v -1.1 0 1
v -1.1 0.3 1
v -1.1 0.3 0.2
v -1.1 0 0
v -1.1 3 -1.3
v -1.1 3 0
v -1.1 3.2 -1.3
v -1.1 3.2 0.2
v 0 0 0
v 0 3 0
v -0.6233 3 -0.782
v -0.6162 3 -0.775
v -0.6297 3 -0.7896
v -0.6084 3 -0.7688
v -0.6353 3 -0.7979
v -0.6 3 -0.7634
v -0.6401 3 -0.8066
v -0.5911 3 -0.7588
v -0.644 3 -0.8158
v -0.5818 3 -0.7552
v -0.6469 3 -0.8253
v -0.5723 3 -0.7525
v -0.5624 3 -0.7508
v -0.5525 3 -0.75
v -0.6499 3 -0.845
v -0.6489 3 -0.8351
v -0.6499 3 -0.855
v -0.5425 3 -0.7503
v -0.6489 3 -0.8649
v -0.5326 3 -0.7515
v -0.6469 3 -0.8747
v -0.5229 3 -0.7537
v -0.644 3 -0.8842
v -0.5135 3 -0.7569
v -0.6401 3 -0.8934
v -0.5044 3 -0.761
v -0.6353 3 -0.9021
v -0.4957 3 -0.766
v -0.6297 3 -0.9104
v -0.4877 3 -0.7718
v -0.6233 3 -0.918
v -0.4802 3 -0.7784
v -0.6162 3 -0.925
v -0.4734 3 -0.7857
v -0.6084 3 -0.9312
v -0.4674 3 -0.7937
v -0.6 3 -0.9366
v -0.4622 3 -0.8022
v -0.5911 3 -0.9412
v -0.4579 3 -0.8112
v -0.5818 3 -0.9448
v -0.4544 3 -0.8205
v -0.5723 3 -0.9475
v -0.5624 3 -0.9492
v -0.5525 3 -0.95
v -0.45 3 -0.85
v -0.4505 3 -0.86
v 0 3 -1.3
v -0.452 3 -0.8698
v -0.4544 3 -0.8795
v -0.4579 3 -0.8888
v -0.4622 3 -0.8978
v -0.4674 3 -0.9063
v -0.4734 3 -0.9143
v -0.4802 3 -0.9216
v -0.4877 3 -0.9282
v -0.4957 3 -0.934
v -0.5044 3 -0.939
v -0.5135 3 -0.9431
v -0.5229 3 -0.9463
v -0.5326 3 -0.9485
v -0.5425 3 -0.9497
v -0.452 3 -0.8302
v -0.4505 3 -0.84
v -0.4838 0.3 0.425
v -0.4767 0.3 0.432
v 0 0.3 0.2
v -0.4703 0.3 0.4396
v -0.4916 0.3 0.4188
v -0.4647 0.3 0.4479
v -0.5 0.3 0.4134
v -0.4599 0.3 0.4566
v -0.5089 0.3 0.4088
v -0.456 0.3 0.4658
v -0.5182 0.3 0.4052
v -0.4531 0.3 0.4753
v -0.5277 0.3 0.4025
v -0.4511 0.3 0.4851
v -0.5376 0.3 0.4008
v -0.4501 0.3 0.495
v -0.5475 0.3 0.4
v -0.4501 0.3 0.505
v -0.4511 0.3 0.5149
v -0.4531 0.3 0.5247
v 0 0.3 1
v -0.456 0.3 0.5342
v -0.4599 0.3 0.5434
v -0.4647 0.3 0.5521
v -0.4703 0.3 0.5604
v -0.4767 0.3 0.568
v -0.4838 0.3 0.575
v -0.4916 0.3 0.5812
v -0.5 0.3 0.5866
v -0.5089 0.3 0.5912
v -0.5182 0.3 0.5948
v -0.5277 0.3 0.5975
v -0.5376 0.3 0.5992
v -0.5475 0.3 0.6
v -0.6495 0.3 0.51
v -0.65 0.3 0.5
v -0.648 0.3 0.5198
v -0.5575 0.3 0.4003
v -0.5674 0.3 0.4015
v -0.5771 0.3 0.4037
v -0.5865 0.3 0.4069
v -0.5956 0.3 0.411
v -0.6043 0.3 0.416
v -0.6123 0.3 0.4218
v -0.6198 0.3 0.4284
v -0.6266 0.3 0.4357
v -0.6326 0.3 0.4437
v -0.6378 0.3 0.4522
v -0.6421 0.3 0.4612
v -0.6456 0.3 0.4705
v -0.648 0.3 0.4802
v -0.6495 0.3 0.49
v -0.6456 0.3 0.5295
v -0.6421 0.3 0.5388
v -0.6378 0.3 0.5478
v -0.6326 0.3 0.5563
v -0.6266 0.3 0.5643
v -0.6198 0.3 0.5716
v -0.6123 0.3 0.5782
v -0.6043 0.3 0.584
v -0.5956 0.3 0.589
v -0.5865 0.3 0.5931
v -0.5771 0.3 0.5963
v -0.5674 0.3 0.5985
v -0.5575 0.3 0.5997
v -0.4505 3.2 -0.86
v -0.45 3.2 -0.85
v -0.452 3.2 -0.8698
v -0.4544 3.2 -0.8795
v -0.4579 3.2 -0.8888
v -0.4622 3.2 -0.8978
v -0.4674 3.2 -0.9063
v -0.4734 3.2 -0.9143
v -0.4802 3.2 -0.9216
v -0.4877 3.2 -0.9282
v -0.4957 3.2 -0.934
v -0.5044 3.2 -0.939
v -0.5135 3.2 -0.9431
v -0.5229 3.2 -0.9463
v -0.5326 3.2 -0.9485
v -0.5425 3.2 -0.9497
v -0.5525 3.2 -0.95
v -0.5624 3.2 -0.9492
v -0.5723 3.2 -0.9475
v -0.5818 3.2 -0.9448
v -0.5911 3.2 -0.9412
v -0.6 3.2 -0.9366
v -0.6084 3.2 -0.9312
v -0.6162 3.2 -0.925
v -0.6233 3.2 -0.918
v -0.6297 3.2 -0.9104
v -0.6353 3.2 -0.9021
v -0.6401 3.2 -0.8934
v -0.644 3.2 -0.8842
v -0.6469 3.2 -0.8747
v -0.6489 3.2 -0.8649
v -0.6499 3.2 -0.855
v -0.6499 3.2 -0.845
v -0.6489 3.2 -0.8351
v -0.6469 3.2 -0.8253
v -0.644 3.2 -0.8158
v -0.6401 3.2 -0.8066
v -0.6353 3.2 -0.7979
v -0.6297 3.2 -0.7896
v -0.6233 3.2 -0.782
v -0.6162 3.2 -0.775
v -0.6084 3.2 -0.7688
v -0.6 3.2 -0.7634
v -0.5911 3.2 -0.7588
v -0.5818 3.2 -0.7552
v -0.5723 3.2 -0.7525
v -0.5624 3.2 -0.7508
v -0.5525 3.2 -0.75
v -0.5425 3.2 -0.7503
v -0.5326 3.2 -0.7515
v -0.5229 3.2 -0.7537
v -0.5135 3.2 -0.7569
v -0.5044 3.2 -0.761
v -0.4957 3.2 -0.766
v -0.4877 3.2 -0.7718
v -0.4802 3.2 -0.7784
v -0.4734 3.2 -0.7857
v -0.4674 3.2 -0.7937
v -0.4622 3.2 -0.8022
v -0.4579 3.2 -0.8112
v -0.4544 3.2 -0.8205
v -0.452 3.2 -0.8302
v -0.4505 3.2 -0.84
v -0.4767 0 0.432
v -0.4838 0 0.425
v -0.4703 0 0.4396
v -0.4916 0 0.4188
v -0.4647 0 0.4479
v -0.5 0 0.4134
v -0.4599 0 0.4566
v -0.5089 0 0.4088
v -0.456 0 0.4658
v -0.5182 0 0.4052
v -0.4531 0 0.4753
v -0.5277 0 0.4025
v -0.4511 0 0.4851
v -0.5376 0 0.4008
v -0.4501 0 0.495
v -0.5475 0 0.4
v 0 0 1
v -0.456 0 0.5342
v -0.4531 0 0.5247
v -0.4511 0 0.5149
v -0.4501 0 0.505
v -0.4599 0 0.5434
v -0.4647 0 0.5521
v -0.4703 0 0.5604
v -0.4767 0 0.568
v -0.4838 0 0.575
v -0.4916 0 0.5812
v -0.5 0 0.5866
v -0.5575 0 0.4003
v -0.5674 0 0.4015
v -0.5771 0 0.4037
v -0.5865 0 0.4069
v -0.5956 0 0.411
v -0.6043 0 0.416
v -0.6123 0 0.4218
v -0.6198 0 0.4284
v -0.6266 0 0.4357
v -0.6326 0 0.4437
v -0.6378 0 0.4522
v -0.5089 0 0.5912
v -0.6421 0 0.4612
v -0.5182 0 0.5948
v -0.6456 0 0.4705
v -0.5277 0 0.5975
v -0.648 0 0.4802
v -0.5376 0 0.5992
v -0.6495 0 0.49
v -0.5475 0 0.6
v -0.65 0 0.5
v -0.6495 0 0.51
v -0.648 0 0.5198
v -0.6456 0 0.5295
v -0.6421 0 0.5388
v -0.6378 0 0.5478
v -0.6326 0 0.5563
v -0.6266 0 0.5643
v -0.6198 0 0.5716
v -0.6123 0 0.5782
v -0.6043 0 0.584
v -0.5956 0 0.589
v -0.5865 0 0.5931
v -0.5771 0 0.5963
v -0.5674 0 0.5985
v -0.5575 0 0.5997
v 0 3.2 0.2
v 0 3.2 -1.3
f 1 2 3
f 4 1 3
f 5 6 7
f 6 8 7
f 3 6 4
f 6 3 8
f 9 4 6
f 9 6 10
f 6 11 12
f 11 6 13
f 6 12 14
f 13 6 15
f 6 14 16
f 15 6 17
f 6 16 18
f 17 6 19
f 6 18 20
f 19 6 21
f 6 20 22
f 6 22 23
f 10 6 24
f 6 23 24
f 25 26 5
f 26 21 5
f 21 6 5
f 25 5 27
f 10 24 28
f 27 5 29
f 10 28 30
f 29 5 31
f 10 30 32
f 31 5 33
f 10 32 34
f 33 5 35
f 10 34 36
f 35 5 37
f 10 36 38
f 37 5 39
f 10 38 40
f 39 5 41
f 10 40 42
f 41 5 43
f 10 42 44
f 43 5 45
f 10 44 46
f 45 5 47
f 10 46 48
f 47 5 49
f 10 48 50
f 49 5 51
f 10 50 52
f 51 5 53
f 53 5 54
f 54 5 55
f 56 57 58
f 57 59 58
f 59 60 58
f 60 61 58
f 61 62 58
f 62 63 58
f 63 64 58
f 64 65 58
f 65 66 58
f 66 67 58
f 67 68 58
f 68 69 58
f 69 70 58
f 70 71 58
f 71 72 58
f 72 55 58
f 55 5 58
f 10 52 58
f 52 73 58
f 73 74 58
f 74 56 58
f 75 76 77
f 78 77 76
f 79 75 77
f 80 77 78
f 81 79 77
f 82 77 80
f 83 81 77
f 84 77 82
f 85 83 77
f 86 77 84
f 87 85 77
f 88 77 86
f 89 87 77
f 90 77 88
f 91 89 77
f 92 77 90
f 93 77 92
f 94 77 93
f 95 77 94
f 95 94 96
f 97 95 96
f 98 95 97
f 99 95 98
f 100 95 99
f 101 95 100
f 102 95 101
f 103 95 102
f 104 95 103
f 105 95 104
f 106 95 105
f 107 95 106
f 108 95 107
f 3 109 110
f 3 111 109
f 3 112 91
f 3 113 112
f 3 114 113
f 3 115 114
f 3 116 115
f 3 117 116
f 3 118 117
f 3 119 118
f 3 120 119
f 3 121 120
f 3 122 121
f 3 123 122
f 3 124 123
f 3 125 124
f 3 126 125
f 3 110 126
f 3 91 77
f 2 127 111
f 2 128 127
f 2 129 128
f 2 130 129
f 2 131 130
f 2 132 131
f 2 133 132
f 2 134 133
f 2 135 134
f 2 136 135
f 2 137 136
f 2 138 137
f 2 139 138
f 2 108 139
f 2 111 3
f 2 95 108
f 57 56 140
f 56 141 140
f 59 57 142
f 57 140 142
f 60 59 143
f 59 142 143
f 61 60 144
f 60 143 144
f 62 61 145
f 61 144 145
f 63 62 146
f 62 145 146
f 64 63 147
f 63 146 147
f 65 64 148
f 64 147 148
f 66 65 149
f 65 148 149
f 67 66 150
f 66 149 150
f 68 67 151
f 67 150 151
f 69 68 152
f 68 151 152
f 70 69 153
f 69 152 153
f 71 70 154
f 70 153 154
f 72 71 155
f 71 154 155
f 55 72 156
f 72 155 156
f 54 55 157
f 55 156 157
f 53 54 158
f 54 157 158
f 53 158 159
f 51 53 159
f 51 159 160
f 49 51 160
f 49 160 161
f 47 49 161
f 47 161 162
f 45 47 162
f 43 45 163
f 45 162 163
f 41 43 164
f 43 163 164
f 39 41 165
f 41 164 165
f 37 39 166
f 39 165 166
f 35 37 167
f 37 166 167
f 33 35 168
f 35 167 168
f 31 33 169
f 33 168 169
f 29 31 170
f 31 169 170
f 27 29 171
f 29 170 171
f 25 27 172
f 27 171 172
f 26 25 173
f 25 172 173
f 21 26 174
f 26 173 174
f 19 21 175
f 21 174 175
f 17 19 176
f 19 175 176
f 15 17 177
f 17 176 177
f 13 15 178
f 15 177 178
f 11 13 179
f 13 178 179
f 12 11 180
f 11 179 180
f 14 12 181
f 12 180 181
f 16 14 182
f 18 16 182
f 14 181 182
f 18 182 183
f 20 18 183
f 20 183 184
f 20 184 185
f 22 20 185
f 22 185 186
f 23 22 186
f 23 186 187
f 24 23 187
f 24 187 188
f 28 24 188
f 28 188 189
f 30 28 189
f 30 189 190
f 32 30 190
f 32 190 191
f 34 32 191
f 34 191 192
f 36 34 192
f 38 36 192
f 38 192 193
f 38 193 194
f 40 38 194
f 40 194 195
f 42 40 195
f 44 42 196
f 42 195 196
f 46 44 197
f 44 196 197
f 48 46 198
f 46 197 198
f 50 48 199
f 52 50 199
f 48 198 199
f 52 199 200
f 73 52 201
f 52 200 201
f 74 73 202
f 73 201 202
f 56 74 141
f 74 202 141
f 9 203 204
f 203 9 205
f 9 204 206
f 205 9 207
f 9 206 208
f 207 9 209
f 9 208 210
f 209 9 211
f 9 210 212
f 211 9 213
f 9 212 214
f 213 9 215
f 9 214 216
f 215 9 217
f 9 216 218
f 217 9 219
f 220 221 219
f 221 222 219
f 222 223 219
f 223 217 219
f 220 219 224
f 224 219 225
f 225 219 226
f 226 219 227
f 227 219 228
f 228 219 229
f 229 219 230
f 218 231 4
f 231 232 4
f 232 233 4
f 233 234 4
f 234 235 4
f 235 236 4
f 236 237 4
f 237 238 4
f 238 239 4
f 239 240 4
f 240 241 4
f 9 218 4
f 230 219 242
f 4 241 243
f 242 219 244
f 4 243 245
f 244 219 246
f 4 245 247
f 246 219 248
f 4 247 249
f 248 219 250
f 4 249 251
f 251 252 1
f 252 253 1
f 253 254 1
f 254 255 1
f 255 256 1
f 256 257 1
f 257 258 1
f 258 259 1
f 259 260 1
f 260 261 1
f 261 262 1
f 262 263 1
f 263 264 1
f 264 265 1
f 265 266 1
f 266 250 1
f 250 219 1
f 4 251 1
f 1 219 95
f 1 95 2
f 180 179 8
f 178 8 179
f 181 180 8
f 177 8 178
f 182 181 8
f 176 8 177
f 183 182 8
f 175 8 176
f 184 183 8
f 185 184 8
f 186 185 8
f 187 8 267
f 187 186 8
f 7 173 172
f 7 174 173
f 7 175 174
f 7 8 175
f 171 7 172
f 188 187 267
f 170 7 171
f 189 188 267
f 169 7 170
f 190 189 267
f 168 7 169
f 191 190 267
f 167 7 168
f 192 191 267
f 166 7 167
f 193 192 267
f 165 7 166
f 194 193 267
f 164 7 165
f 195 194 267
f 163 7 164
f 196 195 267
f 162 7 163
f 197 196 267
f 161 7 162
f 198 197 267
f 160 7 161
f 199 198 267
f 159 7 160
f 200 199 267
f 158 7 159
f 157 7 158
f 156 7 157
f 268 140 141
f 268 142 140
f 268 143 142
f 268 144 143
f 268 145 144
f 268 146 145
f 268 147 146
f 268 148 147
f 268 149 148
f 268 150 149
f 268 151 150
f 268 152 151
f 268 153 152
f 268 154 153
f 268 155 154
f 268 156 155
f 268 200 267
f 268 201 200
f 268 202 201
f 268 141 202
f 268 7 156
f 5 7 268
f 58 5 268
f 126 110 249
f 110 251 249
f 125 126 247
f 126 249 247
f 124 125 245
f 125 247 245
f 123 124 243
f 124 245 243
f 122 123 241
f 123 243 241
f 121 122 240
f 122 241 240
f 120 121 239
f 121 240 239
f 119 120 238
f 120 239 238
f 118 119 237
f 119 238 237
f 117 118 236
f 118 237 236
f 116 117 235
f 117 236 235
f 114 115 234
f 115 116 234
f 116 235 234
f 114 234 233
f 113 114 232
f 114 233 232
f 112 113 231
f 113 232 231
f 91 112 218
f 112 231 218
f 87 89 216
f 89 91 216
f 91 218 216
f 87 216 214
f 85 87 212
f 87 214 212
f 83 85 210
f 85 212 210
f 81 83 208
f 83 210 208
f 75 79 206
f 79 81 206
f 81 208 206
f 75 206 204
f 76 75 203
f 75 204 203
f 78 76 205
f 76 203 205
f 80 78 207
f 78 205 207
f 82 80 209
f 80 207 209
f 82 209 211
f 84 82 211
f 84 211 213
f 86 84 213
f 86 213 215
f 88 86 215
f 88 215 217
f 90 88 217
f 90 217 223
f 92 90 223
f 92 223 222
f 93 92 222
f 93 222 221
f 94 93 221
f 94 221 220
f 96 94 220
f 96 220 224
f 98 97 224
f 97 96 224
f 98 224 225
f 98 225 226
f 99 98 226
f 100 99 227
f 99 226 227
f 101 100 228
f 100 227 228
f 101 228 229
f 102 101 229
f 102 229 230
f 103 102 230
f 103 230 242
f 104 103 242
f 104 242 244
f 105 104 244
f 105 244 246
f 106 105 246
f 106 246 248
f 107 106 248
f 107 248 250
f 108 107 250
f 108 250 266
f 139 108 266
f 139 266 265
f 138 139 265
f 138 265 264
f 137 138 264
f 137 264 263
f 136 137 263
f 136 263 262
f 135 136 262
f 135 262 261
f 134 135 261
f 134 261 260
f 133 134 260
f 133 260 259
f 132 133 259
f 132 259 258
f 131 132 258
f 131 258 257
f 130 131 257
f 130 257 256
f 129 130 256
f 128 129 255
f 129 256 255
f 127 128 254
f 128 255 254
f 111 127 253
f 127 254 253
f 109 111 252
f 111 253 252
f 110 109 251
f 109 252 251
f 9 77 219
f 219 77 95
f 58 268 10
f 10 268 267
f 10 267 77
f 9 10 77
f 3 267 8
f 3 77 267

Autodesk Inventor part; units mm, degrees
ref_plane "YZ Plane" through (0, 0, 0) normal (1, 0, 0) x (0, 1, 0)
ref_plane "XZ Plane" through (0, 0, 0) normal (0, 1, 0) x (-1, 0, 0)
ref_plane "XY Plane" through (0, 0, 0) normal (0, 0, 1) x (1, 0, 0)
sketch "Boceto1" plane through (0, 0, 0) normal (0, 1, 0) x (-1, 0, 0)
  line L0 (0, 0) -> (0, 1)
  line L1 (0, 1) -> (1.1, 1)
  line L2 (1.1, 1) -> (1.1, 0)
  line L3 (1.1, 0) -> (0, 0)
  circle A0 centre (0.55, 0.5) radius 0.1
  dimension "d0" = 1
  dimension "d1" = 1.1
  dimension "d2" = 0.2
extrude "Extrusión1" add sketch "Boceto1" along normal blind 0.3
sketch "Boceto2" plane through (0, 0.3, 0) normal (0, 1, 0) x (1, 0, 0)
  line L0 (0, -1) -> (0, 0) projected
  line L1 (0, 0) -> (0, -0.2)
  line L2 (0, -0.2) -> (-1.1, -0.2)
  line L3 (-1.1, 0) -> (-1.1, -1) projected
  line L4 (-1.1, -0.2) -> (0, -0.2)
  line L5 (0, -0.2) -> (0, 0)
  line L6 (0, 0) -> (-1.1, 0)
  line L7 (-1.1, 0) -> (-1.1, -0.2)
  dimension "d5" = 0.2
extrude "Extrusión2" add sketch "Boceto2" along normal blind 2.9
sketch "Boceto4" plane through (0, 3.2, 0) normal (0, 1, 0) x (1, 0, 0)
  circle A0 centre (-0.55, -0.5) radius 0.1 projected
  line L0 (0, 0) -> (-1.1, 0) projected
  line L1 (-1.1, 0) -> (-1.1, 1.3)
  line L2 (-1.1, 1.3) -> (0, 1.3)
  line L3 (0, 0) -> (0, -1) projected
  line L4 (0, 1.3) -> (0, 0)
  line L5 (0, 0) -> (-1.1, 0)
  circle A1 centre (-0.55, 0.85) radius 0.1
  dimension "d12" = 1.3
  dimension "d18" = 0.2
extrude "Extrusión4" add sketch "Boceto4" against normal blind 0.2 contours L0 L1 L2 L4
properties part number "soporteOdroid"
